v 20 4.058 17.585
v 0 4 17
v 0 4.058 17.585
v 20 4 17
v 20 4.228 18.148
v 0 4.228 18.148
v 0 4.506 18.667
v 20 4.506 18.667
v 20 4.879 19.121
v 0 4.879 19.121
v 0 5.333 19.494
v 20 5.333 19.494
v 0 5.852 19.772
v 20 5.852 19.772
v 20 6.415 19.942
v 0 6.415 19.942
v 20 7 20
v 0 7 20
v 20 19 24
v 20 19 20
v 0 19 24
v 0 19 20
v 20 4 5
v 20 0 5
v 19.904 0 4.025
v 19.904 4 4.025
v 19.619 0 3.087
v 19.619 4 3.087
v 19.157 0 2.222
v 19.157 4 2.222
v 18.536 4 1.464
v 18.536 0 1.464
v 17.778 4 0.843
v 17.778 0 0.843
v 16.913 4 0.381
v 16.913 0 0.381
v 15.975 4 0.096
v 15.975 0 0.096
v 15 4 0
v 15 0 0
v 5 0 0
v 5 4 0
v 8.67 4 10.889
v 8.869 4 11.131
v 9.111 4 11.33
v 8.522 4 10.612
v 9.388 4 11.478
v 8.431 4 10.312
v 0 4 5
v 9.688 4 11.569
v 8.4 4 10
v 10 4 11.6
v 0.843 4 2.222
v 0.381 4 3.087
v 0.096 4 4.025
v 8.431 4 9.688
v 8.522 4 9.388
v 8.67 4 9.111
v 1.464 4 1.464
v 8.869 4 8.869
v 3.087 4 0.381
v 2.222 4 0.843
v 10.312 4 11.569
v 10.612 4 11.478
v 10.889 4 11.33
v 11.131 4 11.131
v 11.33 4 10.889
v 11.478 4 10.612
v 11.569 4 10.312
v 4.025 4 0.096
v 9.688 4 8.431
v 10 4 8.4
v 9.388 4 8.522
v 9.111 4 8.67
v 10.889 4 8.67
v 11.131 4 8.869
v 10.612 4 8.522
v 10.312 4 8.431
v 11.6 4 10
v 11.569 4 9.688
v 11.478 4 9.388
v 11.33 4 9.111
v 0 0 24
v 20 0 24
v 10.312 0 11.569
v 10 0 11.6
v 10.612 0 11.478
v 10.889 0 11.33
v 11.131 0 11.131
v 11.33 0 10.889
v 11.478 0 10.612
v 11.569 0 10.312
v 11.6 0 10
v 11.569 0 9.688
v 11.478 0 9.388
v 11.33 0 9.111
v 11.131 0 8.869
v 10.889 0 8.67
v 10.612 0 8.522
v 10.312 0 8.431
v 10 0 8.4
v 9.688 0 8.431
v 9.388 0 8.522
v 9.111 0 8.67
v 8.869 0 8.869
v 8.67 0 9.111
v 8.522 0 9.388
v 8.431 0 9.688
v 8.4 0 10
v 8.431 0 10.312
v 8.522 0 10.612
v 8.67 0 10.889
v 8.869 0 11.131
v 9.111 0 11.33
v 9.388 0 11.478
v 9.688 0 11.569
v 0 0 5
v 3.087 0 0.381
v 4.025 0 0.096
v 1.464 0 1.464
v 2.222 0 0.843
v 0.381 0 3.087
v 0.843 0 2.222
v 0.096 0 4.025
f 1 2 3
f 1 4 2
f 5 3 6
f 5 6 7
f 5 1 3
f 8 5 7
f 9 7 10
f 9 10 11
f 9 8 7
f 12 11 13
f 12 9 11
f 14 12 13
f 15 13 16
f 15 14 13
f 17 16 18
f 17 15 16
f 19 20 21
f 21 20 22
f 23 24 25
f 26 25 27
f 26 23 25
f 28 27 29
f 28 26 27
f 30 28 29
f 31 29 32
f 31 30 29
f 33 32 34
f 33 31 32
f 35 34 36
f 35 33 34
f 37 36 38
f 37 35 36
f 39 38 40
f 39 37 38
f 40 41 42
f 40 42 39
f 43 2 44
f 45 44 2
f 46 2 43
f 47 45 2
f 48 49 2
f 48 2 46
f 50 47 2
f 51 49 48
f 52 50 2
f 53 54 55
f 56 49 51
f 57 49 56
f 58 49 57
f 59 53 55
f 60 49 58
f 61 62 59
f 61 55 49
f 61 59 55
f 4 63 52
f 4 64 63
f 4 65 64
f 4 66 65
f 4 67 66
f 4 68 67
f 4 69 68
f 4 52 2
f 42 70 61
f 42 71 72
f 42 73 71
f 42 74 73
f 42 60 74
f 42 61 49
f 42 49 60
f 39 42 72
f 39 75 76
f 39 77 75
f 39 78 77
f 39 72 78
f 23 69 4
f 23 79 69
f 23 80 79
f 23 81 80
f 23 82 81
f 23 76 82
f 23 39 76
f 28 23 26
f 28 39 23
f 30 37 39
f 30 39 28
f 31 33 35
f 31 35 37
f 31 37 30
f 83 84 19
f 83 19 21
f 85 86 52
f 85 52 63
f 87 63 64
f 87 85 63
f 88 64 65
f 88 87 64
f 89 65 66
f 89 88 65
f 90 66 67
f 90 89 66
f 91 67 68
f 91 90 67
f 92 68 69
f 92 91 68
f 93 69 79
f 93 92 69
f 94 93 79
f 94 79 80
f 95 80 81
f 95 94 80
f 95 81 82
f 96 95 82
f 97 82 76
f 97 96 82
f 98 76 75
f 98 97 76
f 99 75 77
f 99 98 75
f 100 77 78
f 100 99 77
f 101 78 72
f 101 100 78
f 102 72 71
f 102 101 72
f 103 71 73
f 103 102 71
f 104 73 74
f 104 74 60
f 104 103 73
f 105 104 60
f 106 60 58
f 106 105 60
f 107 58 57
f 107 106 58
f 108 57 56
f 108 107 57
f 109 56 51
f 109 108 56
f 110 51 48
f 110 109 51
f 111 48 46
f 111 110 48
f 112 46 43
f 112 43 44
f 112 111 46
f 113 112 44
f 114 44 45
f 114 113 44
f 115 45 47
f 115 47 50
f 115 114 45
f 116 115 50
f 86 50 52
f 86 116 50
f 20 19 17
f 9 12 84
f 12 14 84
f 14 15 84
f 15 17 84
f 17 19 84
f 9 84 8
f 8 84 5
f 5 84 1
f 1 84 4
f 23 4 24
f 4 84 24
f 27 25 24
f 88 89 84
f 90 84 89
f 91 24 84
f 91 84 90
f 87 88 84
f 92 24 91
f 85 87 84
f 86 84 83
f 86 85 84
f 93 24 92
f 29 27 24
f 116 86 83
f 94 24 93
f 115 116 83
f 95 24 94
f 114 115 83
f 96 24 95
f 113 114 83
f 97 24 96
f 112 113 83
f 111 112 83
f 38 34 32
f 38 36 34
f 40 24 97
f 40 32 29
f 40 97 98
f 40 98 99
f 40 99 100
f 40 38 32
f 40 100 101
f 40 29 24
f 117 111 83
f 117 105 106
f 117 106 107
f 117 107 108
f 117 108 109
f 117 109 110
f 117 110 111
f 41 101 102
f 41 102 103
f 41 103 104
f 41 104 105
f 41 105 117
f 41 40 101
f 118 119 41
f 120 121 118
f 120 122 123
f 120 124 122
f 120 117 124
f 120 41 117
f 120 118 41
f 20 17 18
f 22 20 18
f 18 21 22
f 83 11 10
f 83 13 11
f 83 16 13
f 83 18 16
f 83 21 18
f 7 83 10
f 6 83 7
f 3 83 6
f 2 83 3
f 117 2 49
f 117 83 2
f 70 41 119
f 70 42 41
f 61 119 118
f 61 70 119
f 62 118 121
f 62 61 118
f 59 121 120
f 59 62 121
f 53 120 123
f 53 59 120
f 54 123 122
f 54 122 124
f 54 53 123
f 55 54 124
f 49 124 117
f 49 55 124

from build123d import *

# Parameters (mm, degrees)
SKETCH1_W           = 20
SKETCH1_H           = 20
SKETCH1_R           = 1.6
BOSS_EXTRUDE1_DEPTH = 4
SKETCH2_W           = 20
SKETCH2_H           = 4
BOSS_EXTRUDE2_DEPTH = 19
FILLET1_R           = 3
FILLET2_R           = 5


with BuildPart() as part:
    # Sketch1 → Boss-Extrude1 (new body)
    with BuildSketch(Plane(origin=(0, 0, 0), x_dir=(1, 0, 0), z_dir=(0, 1, 0))):
        with Locations((10, -10)):
            Rectangle(SKETCH1_W, SKETCH1_H)
        with Locations(Location((10, -10, 0), (0, 0, 270))):
            Circle(SKETCH1_R, mode=Mode.SUBTRACT)
    extrude(amount=BOSS_EXTRUDE1_DEPTH)

    # Sketch2 → Boss-Extrude2 (add)
    with BuildSketch(Plane(origin=(0, 0, 0), x_dir=(-1, 0, 0), z_dir=(0, -1, 0))):
        with Locations((-10, -22)):
            Rectangle(SKETCH2_W, SKETCH2_H)
    extrude(amount=-BOSS_EXTRUDE2_DEPTH)

    # Fillet1
    fillet1_edges = [part.edges().sort_by_distance(p)[0] for p in [
        (10, 4, 20),
    ]]
    fillet(fillet1_edges, radius=FILLET1_R)

    # Fillet2
    fillet2_edges = [part.edges().sort_by_distance(p)[0] for p in [
        (0, 2, 0),
        (20, 2, 0),
    ]]
    fillet(fillet2_edges, radius=FILLET2_R)


solid = part.part
